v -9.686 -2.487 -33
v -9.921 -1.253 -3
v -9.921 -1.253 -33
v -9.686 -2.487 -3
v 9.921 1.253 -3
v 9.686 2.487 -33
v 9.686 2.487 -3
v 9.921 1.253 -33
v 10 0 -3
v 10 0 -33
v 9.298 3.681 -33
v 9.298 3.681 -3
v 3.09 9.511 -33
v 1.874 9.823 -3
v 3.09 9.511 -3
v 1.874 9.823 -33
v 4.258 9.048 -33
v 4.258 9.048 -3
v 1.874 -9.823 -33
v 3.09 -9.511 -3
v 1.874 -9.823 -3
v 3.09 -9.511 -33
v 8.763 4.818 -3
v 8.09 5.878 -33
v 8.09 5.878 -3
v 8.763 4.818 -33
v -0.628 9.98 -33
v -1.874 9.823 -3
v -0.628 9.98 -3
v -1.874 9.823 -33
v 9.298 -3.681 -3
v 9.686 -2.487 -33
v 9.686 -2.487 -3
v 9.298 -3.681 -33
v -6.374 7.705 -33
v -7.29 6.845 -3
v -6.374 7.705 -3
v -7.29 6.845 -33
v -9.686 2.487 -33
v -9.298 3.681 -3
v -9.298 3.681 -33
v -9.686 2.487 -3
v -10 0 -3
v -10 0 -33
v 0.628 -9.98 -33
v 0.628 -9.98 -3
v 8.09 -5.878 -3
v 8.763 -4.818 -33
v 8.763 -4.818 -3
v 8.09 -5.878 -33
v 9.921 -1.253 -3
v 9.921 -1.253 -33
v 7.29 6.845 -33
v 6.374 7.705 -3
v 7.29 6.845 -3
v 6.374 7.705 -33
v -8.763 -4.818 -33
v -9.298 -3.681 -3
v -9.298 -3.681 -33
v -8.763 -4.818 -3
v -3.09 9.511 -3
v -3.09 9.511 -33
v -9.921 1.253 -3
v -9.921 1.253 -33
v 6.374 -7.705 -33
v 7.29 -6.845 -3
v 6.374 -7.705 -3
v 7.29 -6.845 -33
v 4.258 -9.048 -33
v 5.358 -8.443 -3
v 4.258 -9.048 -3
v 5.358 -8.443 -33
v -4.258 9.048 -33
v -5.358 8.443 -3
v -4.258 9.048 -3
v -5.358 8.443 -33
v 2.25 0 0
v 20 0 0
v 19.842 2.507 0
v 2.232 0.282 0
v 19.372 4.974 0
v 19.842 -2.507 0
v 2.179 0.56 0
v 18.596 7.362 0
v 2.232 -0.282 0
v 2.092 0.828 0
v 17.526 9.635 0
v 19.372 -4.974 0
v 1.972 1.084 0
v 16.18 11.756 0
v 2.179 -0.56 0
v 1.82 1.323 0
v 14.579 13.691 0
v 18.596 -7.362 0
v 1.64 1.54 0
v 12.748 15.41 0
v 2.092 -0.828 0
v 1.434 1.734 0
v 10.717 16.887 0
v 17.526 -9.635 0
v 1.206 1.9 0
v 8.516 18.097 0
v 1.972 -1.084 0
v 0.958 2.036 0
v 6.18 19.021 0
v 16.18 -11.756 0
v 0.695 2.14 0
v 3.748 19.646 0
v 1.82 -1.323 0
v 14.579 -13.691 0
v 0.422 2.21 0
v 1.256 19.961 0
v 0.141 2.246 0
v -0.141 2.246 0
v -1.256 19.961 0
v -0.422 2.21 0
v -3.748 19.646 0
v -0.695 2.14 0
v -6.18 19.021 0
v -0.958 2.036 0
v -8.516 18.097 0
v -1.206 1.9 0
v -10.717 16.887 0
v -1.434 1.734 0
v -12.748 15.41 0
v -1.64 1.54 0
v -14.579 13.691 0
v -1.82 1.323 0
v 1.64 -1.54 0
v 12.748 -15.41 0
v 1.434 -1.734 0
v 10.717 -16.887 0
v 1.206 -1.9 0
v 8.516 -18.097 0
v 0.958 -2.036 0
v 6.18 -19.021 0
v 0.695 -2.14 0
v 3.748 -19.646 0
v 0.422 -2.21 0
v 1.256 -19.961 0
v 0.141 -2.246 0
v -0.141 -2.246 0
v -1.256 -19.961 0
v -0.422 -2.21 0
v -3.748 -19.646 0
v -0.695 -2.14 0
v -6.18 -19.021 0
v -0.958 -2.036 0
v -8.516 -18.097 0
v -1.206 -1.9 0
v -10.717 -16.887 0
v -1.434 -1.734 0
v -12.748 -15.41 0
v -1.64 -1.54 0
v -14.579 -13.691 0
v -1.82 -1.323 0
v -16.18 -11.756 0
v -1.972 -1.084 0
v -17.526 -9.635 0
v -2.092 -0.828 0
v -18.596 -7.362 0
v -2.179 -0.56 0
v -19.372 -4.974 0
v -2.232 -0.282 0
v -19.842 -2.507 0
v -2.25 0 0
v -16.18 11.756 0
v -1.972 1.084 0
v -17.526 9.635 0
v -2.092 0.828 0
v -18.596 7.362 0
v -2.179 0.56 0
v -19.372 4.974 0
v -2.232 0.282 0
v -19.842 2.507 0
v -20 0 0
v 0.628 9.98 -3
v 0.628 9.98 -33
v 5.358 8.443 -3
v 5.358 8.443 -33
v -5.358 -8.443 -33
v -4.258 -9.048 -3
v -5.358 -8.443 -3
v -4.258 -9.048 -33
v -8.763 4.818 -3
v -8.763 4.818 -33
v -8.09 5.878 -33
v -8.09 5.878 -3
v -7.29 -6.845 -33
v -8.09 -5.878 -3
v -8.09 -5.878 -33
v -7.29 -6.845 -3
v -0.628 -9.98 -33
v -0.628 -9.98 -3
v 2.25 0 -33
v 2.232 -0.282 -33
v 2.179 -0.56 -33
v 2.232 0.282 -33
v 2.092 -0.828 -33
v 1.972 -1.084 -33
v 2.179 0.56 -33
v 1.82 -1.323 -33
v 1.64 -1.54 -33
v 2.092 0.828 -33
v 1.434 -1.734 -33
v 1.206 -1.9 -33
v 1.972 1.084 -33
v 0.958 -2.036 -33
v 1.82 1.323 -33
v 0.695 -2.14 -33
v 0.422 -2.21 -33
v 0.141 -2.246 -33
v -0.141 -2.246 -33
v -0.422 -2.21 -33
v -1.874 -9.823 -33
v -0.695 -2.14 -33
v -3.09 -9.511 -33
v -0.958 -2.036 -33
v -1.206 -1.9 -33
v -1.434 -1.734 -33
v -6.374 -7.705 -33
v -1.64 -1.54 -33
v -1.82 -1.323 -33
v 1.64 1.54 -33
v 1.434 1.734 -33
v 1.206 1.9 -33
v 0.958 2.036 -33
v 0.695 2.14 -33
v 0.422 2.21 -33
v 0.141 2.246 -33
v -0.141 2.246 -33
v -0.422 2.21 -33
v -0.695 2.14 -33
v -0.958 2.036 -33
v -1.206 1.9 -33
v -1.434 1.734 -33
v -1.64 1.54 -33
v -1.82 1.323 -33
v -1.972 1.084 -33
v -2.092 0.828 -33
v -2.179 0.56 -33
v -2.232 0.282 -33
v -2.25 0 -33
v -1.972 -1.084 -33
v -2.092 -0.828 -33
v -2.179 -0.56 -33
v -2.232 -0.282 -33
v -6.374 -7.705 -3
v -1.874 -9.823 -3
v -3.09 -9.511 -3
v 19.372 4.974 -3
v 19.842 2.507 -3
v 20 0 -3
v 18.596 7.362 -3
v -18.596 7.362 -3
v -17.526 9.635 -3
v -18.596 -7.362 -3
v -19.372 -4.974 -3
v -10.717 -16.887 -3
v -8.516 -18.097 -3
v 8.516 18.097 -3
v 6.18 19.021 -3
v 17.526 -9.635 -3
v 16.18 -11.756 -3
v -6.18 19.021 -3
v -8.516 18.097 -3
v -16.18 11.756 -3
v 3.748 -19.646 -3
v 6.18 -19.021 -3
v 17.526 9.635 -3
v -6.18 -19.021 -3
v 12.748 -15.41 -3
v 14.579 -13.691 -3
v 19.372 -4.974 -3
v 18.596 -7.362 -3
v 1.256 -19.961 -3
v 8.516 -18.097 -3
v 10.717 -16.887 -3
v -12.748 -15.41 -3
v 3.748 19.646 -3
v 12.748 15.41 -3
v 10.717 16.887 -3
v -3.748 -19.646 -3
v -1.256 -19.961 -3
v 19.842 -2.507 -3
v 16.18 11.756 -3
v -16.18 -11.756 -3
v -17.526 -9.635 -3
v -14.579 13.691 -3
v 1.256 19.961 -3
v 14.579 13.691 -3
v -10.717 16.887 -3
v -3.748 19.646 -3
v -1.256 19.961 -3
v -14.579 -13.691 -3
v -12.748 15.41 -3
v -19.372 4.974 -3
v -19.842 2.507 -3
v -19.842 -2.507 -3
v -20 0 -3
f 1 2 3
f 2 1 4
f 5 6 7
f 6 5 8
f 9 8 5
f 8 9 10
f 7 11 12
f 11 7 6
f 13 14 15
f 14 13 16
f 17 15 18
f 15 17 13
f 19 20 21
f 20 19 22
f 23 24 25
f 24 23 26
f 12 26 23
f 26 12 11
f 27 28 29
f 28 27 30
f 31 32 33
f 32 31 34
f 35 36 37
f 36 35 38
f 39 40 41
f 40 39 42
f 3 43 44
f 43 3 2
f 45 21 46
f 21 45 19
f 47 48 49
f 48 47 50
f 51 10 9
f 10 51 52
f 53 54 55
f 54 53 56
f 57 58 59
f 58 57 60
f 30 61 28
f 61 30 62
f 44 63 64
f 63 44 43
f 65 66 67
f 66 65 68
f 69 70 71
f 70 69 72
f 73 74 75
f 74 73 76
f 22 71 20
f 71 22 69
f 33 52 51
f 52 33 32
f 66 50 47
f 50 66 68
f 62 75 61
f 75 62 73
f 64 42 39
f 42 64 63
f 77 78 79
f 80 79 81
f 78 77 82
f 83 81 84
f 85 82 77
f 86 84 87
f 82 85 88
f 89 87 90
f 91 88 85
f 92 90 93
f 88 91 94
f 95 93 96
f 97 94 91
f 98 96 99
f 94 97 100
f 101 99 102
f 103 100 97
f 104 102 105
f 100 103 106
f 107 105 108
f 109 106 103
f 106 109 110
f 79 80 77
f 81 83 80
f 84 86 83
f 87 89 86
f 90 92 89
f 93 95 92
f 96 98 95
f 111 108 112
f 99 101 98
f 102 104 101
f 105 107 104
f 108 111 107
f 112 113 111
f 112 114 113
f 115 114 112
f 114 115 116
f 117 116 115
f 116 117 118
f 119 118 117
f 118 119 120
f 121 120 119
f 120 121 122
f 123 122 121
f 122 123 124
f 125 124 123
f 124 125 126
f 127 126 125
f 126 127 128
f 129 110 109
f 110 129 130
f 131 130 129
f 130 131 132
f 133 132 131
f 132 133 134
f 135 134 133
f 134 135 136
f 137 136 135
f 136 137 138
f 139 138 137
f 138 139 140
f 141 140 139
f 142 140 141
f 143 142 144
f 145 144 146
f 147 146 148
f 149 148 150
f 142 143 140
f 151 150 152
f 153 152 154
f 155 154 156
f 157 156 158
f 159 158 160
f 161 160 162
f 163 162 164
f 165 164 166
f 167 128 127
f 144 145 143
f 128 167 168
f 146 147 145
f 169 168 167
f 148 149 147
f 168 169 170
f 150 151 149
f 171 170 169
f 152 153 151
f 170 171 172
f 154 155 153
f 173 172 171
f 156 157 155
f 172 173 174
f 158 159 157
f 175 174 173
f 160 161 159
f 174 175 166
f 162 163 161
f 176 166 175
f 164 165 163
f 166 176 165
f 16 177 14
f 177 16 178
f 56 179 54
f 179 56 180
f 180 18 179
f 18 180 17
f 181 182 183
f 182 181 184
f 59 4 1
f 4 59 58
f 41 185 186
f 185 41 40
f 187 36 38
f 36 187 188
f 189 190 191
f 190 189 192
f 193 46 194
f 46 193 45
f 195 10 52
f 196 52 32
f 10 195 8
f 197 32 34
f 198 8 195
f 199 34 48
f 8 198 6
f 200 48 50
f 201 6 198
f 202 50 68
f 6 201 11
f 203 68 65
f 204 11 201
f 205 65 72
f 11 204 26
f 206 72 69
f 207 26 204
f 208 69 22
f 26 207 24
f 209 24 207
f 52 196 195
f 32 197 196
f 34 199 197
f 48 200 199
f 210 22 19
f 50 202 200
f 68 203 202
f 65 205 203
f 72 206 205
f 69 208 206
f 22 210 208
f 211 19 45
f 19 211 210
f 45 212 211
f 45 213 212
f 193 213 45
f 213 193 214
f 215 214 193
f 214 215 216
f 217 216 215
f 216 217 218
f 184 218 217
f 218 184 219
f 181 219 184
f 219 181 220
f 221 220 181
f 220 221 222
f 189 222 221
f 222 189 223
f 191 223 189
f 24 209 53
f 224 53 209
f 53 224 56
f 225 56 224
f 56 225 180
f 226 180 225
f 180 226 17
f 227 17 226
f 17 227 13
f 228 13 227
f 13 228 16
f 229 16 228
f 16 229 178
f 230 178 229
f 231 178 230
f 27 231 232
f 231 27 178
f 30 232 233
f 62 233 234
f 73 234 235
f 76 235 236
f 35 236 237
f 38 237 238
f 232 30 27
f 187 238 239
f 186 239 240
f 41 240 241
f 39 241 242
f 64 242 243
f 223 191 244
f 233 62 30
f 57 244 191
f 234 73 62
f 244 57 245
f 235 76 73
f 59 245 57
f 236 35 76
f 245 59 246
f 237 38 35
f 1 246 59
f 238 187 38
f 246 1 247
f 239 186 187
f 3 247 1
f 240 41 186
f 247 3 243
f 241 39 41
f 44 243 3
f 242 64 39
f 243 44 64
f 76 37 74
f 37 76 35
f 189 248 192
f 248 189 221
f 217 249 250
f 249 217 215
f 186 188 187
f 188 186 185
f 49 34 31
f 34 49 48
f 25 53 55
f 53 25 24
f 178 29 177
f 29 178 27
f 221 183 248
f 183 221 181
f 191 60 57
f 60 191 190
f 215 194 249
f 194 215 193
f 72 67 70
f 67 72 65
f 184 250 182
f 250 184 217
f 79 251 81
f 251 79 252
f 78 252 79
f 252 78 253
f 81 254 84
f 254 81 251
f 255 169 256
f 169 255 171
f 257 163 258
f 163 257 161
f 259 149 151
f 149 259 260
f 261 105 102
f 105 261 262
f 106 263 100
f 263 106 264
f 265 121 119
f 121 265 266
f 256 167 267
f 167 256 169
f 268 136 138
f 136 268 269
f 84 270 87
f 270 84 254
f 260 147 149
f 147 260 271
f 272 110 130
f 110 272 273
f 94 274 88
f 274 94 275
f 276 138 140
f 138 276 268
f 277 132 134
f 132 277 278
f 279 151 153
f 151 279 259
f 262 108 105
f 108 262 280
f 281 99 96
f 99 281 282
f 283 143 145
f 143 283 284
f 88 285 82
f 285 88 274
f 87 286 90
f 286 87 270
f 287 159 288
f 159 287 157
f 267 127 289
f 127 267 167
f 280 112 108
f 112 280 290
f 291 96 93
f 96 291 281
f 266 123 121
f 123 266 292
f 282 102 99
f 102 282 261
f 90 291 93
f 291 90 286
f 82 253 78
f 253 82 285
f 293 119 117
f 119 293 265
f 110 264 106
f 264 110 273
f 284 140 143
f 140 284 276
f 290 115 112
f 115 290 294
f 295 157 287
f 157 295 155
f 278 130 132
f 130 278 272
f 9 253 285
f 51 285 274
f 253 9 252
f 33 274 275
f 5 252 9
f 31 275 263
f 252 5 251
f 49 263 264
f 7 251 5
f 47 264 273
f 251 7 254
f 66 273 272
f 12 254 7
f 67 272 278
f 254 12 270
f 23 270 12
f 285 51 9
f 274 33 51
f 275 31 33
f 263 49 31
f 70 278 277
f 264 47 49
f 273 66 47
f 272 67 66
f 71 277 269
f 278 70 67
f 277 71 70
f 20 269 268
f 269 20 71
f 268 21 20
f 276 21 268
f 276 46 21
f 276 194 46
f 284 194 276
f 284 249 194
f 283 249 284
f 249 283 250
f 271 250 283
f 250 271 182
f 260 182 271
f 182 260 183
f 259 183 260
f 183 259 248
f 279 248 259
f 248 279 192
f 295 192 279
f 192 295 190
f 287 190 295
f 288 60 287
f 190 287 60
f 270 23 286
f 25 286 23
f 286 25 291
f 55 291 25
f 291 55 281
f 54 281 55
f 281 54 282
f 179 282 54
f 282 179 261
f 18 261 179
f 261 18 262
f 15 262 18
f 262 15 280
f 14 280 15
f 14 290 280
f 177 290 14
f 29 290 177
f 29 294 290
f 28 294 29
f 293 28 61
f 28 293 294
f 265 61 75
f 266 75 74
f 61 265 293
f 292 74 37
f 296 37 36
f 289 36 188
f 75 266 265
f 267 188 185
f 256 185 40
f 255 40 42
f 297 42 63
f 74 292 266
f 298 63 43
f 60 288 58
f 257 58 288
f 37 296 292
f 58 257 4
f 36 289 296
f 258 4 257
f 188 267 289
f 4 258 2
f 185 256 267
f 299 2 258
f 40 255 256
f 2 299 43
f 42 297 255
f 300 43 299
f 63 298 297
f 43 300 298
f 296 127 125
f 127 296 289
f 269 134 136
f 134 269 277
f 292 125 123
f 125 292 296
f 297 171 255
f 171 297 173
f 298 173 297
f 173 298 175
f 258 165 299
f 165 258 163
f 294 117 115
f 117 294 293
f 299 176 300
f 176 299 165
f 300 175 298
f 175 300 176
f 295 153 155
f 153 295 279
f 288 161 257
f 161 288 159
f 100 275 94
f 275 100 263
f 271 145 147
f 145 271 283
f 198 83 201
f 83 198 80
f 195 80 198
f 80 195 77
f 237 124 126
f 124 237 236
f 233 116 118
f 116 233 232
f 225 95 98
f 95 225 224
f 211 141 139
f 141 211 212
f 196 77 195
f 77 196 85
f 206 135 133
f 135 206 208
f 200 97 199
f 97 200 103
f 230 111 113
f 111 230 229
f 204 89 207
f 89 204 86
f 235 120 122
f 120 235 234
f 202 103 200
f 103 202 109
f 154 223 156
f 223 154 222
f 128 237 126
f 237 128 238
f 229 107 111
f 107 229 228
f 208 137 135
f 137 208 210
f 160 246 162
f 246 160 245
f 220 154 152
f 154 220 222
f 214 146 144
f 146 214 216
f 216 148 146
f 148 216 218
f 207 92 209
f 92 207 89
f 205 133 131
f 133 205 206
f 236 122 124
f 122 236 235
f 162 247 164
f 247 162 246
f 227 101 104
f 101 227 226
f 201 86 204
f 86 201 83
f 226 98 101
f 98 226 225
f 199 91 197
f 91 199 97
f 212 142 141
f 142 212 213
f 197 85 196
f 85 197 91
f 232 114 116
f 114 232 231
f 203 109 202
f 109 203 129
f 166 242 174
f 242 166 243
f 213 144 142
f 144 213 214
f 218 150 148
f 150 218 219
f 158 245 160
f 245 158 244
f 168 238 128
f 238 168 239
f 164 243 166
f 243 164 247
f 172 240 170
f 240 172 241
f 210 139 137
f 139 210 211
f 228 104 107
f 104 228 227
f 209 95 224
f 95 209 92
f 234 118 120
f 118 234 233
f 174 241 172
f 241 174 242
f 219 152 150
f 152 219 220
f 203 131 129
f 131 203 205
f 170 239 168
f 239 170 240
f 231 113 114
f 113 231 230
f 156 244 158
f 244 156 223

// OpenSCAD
$fn = 50;


difference() {
	union() {
		translate(v = [0, 0, -33.0000000000]) {
			cylinder(h = 33, r = 10.0000000000);
		}
		translate(v = [0, 0, -3.0000000000]) {
			cylinder(h = 3, r = 20.0000000000);
		}
	}
	union() {
		#translate(v = [0, 0, -33]) {
			cylinder(h = 33, r = 2.2500000000);
		}
	}
}
